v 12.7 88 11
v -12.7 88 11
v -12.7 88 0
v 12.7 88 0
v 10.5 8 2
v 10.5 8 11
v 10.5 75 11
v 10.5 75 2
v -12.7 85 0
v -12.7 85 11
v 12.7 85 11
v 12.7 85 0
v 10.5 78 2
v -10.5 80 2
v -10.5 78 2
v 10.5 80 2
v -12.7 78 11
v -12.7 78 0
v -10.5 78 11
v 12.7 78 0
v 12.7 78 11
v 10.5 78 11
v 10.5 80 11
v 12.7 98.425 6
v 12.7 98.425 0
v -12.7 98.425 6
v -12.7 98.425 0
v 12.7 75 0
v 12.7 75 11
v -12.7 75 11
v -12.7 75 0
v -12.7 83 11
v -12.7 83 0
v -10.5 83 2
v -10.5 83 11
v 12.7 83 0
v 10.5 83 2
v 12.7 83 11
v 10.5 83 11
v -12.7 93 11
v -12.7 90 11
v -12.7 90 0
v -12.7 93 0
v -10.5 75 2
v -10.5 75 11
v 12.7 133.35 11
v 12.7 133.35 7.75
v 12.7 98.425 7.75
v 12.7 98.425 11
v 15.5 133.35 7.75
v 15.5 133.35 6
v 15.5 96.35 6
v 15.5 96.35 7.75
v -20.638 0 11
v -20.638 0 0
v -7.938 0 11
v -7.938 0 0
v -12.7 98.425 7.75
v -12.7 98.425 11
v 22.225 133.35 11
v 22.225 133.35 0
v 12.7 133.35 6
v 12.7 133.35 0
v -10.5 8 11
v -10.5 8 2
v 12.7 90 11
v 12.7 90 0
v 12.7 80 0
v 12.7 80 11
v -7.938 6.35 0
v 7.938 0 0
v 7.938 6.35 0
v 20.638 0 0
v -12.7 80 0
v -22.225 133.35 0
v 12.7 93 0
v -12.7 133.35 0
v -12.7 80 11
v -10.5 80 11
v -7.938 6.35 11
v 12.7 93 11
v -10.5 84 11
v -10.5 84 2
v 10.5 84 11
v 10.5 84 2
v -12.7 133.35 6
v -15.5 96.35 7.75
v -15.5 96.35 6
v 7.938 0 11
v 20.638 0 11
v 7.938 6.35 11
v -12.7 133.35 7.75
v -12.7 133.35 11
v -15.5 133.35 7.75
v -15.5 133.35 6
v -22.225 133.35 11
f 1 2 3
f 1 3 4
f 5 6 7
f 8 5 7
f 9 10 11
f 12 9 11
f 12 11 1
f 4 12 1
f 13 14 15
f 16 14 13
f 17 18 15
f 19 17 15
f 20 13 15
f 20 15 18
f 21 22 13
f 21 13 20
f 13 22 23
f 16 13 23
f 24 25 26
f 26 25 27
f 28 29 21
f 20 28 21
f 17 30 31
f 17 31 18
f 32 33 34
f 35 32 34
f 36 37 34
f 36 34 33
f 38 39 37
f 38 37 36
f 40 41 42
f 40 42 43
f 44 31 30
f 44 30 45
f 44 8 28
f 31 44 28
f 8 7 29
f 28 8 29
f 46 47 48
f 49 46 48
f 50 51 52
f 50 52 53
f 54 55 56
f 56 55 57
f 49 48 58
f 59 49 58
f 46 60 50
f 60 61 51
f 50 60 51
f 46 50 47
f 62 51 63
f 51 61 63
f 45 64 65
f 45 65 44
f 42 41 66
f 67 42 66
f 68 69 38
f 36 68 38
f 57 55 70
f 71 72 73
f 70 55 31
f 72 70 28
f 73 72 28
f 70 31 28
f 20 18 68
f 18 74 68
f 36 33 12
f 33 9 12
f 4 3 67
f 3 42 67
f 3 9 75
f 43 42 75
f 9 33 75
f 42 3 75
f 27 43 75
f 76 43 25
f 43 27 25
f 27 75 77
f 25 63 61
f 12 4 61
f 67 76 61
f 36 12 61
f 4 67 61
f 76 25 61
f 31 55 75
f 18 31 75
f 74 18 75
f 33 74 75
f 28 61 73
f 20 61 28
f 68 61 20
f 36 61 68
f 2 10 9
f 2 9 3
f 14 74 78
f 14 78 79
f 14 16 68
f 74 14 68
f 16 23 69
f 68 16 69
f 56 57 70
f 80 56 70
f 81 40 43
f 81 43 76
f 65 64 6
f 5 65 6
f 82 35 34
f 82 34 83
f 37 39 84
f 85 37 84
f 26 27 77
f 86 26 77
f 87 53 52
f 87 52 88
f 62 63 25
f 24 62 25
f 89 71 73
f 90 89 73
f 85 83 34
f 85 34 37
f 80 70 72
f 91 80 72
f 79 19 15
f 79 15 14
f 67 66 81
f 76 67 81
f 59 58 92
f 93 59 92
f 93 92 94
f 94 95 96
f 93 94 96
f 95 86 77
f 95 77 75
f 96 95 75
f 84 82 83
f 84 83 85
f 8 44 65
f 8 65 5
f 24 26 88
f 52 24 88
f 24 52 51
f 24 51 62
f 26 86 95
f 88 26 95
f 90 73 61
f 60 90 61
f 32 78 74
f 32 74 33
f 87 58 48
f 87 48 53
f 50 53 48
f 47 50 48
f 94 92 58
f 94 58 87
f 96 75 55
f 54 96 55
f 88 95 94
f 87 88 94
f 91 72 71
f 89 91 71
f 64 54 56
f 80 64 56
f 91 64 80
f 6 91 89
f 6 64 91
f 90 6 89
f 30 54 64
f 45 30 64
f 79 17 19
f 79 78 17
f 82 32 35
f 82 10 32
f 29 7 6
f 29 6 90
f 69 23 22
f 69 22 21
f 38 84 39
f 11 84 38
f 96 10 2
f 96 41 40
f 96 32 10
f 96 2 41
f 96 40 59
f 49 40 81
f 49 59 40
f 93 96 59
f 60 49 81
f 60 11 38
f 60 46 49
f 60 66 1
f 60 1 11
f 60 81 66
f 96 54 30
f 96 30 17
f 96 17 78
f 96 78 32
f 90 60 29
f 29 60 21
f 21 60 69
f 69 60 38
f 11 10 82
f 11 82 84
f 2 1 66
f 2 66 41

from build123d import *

# Parameters (mm, degrees)
PAD_DEPTH       = 11
SKETCH001_W     = 25.4
SKETCH001_H     = 3
POCKET_DEPTH    = 11.001
SKETCH003_W     = 31
SKETCH003_H     = 1.75
POCKET001_DEPTH = 37
SKETCH004_W     = 21
SKETCH004_H     = 76
POCKET002_DEPTH = 9


with BuildPart() as part:
    # Sketch → Pad (new body)
    with BuildSketch(Plane.XY):
        Polygon((-22.225, 133.35), (-20.6375, 0), (-7.9375, 0), (-7.9375, 6.35), (7.9375, 6.35), (7.9375, 0), (20.6375, 0), (22.225, 133.35), (12.7, 133.35), (12.7, 98.425), (-12.7, 98.425), (-12.7, 133.35), align=None)
    extrude(amount=PAD_DEPTH)

    # Sketch001 → Pocket (cut, through all)
    with BuildSketch(Plane.XY.offset(11)):
        with Locations((0, 91.5)):
            Rectangle(SKETCH001_W, SKETCH001_H)
        with Locations((0, 86.5)):
            Rectangle(SKETCH001_W, SKETCH001_H)
        with Locations((0, 81.5)):
            Rectangle(SKETCH001_W, SKETCH001_H)
        with Locations((0, 76.5)):
            Rectangle(SKETCH001_W, SKETCH001_H)
    extrude(amount=-POCKET_DEPTH, mode=Mode.SUBTRACT)

    # Sketch003 → Pocket001 (cut)
    with BuildSketch(Plane(origin=(0, 133.35, 0), x_dir=(-1, 0, 0), z_dir=(0, 1, 0))):
        with Locations((0, 6.875)):
            Rectangle(SKETCH003_W, SKETCH003_H)
    extrude(amount=-POCKET001_DEPTH, mode=Mode.SUBTRACT)

    # Sketch004 → Pocket002 (cut)
    with BuildSketch(Plane.XY.offset(11)):
        with Locations((0, 46)):
            Rectangle(SKETCH004_W, SKETCH004_H)
    extrude(amount=-POCKET002_DEPTH, mode=Mode.SUBTRACT)


solid = part.part
